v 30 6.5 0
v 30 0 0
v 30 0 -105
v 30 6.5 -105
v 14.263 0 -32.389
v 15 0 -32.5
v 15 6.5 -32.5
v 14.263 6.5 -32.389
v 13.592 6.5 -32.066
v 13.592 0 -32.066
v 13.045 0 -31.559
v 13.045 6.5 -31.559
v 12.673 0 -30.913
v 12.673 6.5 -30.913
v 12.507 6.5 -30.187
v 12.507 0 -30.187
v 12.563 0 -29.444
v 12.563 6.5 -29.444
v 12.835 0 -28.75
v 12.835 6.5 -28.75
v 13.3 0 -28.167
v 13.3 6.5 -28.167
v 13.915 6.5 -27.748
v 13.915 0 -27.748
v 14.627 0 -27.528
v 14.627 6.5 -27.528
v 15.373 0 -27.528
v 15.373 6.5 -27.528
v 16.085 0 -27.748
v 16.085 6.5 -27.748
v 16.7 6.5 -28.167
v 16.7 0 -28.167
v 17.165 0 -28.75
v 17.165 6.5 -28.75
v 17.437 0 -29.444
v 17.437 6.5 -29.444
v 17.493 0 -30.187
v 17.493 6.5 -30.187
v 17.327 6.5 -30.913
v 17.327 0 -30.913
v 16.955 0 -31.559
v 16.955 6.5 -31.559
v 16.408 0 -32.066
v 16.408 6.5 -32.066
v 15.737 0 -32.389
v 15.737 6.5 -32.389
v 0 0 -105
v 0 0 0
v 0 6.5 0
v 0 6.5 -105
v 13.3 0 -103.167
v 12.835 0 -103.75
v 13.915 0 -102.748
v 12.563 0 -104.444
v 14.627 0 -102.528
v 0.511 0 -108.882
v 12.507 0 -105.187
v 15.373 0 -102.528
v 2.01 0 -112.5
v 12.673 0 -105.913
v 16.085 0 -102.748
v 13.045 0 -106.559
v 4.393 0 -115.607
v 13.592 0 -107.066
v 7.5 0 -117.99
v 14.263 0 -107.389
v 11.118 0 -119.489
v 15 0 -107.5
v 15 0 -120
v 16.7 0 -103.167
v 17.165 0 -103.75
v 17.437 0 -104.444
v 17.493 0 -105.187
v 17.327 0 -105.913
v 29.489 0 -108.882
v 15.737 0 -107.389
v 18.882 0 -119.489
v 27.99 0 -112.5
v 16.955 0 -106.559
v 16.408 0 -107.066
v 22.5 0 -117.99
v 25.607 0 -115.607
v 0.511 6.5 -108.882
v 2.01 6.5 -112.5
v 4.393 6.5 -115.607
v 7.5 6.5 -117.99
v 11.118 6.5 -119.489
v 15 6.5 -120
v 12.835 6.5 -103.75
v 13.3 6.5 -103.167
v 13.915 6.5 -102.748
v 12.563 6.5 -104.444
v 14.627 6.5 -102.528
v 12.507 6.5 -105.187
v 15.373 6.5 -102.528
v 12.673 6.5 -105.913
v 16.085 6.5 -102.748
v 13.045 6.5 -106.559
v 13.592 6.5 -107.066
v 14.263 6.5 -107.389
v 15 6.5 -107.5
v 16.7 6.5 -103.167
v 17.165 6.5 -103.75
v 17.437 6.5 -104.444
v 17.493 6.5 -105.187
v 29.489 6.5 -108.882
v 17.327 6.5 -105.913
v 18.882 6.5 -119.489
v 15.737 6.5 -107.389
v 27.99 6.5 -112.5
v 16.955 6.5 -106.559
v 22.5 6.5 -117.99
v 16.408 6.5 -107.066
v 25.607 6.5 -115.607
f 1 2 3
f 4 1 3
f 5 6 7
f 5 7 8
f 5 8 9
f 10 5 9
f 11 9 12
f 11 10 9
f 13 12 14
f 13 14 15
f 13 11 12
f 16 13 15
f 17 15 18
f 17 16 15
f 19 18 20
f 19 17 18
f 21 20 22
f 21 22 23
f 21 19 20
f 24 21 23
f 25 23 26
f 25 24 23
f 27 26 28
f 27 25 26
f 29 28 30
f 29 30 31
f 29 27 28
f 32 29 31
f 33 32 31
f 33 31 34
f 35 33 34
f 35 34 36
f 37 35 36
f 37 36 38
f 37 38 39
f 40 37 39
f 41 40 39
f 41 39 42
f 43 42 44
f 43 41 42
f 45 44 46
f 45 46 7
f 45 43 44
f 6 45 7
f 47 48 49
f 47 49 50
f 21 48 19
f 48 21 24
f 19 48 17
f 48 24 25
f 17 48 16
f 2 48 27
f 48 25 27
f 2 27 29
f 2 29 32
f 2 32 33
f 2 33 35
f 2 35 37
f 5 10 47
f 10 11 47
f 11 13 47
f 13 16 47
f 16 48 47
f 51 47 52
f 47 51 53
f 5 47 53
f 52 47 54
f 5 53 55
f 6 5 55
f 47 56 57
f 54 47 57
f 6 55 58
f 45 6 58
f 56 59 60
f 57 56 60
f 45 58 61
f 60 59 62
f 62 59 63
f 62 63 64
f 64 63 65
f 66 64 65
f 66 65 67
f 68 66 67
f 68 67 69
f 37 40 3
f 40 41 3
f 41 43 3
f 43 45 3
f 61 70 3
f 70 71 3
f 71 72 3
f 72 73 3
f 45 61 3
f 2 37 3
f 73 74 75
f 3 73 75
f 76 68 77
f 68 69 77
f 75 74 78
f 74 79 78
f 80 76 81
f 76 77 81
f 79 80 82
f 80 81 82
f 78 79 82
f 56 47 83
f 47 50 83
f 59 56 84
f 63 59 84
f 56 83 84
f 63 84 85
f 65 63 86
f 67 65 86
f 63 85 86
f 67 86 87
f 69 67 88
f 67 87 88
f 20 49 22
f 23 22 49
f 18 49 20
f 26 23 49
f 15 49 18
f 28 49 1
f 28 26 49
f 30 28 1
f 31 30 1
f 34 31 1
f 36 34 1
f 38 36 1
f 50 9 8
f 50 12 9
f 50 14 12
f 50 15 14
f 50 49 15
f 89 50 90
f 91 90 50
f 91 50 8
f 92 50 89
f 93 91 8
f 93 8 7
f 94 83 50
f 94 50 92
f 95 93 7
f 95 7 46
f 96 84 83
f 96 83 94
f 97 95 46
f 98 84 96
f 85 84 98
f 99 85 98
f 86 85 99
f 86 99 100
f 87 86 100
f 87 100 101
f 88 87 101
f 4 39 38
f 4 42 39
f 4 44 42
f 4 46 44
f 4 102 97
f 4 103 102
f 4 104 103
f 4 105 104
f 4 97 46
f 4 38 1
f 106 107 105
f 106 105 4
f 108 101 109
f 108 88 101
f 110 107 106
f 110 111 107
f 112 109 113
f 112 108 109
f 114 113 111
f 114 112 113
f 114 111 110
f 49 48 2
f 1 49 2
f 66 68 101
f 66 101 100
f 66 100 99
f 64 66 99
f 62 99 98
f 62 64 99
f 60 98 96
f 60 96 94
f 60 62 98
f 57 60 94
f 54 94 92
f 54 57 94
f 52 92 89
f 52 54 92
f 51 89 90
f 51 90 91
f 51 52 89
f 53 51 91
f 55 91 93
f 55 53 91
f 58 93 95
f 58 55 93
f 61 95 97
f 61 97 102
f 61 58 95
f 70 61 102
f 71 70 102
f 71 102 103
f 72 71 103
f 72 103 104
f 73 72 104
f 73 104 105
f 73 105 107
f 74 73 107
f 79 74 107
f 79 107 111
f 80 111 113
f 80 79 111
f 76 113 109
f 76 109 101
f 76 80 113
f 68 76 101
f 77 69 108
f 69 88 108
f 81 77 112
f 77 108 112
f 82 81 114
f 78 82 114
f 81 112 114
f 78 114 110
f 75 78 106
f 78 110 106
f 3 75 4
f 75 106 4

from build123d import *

# Parameters (mm, degrees)
SKETCH1_W           = 30
SKETCH1_H           = 120
SKETCH1_R           = 2.5
BOSS_EXTRUDE1_DEPTH = 6.5
FILLET1_R           = 15


with BuildPart() as part:
    # Sketch1 → Boss-Extrude1 (new body)
    with BuildSketch(Plane(origin=(0, 0, 0), x_dir=(1, 0, 0), z_dir=(0, 1, 0))):
        with Locations((15, 60)):
            Rectangle(SKETCH1_W, SKETCH1_H)
        with Locations(Location((15, 30, 0), (0, 0, 90))):
            Circle(SKETCH1_R, mode=Mode.SUBTRACT)
        with Locations(Location((15, 105, 0), (0, 0, 90))):
            Circle(SKETCH1_R, mode=Mode.SUBTRACT)
    extrude(amount=BOSS_EXTRUDE1_DEPTH)

    # Fillet1
    fillet1_edges = [part.edges().sort_by_distance(p)[0] for p in [
        (30, 3.25, -120),
        (0, 3.25, -120),
    ]]
    fillet(fillet1_edges, radius=FILLET1_R - 0.0001)  # a hair under: the kernel refuses the full size


solid = part.part
